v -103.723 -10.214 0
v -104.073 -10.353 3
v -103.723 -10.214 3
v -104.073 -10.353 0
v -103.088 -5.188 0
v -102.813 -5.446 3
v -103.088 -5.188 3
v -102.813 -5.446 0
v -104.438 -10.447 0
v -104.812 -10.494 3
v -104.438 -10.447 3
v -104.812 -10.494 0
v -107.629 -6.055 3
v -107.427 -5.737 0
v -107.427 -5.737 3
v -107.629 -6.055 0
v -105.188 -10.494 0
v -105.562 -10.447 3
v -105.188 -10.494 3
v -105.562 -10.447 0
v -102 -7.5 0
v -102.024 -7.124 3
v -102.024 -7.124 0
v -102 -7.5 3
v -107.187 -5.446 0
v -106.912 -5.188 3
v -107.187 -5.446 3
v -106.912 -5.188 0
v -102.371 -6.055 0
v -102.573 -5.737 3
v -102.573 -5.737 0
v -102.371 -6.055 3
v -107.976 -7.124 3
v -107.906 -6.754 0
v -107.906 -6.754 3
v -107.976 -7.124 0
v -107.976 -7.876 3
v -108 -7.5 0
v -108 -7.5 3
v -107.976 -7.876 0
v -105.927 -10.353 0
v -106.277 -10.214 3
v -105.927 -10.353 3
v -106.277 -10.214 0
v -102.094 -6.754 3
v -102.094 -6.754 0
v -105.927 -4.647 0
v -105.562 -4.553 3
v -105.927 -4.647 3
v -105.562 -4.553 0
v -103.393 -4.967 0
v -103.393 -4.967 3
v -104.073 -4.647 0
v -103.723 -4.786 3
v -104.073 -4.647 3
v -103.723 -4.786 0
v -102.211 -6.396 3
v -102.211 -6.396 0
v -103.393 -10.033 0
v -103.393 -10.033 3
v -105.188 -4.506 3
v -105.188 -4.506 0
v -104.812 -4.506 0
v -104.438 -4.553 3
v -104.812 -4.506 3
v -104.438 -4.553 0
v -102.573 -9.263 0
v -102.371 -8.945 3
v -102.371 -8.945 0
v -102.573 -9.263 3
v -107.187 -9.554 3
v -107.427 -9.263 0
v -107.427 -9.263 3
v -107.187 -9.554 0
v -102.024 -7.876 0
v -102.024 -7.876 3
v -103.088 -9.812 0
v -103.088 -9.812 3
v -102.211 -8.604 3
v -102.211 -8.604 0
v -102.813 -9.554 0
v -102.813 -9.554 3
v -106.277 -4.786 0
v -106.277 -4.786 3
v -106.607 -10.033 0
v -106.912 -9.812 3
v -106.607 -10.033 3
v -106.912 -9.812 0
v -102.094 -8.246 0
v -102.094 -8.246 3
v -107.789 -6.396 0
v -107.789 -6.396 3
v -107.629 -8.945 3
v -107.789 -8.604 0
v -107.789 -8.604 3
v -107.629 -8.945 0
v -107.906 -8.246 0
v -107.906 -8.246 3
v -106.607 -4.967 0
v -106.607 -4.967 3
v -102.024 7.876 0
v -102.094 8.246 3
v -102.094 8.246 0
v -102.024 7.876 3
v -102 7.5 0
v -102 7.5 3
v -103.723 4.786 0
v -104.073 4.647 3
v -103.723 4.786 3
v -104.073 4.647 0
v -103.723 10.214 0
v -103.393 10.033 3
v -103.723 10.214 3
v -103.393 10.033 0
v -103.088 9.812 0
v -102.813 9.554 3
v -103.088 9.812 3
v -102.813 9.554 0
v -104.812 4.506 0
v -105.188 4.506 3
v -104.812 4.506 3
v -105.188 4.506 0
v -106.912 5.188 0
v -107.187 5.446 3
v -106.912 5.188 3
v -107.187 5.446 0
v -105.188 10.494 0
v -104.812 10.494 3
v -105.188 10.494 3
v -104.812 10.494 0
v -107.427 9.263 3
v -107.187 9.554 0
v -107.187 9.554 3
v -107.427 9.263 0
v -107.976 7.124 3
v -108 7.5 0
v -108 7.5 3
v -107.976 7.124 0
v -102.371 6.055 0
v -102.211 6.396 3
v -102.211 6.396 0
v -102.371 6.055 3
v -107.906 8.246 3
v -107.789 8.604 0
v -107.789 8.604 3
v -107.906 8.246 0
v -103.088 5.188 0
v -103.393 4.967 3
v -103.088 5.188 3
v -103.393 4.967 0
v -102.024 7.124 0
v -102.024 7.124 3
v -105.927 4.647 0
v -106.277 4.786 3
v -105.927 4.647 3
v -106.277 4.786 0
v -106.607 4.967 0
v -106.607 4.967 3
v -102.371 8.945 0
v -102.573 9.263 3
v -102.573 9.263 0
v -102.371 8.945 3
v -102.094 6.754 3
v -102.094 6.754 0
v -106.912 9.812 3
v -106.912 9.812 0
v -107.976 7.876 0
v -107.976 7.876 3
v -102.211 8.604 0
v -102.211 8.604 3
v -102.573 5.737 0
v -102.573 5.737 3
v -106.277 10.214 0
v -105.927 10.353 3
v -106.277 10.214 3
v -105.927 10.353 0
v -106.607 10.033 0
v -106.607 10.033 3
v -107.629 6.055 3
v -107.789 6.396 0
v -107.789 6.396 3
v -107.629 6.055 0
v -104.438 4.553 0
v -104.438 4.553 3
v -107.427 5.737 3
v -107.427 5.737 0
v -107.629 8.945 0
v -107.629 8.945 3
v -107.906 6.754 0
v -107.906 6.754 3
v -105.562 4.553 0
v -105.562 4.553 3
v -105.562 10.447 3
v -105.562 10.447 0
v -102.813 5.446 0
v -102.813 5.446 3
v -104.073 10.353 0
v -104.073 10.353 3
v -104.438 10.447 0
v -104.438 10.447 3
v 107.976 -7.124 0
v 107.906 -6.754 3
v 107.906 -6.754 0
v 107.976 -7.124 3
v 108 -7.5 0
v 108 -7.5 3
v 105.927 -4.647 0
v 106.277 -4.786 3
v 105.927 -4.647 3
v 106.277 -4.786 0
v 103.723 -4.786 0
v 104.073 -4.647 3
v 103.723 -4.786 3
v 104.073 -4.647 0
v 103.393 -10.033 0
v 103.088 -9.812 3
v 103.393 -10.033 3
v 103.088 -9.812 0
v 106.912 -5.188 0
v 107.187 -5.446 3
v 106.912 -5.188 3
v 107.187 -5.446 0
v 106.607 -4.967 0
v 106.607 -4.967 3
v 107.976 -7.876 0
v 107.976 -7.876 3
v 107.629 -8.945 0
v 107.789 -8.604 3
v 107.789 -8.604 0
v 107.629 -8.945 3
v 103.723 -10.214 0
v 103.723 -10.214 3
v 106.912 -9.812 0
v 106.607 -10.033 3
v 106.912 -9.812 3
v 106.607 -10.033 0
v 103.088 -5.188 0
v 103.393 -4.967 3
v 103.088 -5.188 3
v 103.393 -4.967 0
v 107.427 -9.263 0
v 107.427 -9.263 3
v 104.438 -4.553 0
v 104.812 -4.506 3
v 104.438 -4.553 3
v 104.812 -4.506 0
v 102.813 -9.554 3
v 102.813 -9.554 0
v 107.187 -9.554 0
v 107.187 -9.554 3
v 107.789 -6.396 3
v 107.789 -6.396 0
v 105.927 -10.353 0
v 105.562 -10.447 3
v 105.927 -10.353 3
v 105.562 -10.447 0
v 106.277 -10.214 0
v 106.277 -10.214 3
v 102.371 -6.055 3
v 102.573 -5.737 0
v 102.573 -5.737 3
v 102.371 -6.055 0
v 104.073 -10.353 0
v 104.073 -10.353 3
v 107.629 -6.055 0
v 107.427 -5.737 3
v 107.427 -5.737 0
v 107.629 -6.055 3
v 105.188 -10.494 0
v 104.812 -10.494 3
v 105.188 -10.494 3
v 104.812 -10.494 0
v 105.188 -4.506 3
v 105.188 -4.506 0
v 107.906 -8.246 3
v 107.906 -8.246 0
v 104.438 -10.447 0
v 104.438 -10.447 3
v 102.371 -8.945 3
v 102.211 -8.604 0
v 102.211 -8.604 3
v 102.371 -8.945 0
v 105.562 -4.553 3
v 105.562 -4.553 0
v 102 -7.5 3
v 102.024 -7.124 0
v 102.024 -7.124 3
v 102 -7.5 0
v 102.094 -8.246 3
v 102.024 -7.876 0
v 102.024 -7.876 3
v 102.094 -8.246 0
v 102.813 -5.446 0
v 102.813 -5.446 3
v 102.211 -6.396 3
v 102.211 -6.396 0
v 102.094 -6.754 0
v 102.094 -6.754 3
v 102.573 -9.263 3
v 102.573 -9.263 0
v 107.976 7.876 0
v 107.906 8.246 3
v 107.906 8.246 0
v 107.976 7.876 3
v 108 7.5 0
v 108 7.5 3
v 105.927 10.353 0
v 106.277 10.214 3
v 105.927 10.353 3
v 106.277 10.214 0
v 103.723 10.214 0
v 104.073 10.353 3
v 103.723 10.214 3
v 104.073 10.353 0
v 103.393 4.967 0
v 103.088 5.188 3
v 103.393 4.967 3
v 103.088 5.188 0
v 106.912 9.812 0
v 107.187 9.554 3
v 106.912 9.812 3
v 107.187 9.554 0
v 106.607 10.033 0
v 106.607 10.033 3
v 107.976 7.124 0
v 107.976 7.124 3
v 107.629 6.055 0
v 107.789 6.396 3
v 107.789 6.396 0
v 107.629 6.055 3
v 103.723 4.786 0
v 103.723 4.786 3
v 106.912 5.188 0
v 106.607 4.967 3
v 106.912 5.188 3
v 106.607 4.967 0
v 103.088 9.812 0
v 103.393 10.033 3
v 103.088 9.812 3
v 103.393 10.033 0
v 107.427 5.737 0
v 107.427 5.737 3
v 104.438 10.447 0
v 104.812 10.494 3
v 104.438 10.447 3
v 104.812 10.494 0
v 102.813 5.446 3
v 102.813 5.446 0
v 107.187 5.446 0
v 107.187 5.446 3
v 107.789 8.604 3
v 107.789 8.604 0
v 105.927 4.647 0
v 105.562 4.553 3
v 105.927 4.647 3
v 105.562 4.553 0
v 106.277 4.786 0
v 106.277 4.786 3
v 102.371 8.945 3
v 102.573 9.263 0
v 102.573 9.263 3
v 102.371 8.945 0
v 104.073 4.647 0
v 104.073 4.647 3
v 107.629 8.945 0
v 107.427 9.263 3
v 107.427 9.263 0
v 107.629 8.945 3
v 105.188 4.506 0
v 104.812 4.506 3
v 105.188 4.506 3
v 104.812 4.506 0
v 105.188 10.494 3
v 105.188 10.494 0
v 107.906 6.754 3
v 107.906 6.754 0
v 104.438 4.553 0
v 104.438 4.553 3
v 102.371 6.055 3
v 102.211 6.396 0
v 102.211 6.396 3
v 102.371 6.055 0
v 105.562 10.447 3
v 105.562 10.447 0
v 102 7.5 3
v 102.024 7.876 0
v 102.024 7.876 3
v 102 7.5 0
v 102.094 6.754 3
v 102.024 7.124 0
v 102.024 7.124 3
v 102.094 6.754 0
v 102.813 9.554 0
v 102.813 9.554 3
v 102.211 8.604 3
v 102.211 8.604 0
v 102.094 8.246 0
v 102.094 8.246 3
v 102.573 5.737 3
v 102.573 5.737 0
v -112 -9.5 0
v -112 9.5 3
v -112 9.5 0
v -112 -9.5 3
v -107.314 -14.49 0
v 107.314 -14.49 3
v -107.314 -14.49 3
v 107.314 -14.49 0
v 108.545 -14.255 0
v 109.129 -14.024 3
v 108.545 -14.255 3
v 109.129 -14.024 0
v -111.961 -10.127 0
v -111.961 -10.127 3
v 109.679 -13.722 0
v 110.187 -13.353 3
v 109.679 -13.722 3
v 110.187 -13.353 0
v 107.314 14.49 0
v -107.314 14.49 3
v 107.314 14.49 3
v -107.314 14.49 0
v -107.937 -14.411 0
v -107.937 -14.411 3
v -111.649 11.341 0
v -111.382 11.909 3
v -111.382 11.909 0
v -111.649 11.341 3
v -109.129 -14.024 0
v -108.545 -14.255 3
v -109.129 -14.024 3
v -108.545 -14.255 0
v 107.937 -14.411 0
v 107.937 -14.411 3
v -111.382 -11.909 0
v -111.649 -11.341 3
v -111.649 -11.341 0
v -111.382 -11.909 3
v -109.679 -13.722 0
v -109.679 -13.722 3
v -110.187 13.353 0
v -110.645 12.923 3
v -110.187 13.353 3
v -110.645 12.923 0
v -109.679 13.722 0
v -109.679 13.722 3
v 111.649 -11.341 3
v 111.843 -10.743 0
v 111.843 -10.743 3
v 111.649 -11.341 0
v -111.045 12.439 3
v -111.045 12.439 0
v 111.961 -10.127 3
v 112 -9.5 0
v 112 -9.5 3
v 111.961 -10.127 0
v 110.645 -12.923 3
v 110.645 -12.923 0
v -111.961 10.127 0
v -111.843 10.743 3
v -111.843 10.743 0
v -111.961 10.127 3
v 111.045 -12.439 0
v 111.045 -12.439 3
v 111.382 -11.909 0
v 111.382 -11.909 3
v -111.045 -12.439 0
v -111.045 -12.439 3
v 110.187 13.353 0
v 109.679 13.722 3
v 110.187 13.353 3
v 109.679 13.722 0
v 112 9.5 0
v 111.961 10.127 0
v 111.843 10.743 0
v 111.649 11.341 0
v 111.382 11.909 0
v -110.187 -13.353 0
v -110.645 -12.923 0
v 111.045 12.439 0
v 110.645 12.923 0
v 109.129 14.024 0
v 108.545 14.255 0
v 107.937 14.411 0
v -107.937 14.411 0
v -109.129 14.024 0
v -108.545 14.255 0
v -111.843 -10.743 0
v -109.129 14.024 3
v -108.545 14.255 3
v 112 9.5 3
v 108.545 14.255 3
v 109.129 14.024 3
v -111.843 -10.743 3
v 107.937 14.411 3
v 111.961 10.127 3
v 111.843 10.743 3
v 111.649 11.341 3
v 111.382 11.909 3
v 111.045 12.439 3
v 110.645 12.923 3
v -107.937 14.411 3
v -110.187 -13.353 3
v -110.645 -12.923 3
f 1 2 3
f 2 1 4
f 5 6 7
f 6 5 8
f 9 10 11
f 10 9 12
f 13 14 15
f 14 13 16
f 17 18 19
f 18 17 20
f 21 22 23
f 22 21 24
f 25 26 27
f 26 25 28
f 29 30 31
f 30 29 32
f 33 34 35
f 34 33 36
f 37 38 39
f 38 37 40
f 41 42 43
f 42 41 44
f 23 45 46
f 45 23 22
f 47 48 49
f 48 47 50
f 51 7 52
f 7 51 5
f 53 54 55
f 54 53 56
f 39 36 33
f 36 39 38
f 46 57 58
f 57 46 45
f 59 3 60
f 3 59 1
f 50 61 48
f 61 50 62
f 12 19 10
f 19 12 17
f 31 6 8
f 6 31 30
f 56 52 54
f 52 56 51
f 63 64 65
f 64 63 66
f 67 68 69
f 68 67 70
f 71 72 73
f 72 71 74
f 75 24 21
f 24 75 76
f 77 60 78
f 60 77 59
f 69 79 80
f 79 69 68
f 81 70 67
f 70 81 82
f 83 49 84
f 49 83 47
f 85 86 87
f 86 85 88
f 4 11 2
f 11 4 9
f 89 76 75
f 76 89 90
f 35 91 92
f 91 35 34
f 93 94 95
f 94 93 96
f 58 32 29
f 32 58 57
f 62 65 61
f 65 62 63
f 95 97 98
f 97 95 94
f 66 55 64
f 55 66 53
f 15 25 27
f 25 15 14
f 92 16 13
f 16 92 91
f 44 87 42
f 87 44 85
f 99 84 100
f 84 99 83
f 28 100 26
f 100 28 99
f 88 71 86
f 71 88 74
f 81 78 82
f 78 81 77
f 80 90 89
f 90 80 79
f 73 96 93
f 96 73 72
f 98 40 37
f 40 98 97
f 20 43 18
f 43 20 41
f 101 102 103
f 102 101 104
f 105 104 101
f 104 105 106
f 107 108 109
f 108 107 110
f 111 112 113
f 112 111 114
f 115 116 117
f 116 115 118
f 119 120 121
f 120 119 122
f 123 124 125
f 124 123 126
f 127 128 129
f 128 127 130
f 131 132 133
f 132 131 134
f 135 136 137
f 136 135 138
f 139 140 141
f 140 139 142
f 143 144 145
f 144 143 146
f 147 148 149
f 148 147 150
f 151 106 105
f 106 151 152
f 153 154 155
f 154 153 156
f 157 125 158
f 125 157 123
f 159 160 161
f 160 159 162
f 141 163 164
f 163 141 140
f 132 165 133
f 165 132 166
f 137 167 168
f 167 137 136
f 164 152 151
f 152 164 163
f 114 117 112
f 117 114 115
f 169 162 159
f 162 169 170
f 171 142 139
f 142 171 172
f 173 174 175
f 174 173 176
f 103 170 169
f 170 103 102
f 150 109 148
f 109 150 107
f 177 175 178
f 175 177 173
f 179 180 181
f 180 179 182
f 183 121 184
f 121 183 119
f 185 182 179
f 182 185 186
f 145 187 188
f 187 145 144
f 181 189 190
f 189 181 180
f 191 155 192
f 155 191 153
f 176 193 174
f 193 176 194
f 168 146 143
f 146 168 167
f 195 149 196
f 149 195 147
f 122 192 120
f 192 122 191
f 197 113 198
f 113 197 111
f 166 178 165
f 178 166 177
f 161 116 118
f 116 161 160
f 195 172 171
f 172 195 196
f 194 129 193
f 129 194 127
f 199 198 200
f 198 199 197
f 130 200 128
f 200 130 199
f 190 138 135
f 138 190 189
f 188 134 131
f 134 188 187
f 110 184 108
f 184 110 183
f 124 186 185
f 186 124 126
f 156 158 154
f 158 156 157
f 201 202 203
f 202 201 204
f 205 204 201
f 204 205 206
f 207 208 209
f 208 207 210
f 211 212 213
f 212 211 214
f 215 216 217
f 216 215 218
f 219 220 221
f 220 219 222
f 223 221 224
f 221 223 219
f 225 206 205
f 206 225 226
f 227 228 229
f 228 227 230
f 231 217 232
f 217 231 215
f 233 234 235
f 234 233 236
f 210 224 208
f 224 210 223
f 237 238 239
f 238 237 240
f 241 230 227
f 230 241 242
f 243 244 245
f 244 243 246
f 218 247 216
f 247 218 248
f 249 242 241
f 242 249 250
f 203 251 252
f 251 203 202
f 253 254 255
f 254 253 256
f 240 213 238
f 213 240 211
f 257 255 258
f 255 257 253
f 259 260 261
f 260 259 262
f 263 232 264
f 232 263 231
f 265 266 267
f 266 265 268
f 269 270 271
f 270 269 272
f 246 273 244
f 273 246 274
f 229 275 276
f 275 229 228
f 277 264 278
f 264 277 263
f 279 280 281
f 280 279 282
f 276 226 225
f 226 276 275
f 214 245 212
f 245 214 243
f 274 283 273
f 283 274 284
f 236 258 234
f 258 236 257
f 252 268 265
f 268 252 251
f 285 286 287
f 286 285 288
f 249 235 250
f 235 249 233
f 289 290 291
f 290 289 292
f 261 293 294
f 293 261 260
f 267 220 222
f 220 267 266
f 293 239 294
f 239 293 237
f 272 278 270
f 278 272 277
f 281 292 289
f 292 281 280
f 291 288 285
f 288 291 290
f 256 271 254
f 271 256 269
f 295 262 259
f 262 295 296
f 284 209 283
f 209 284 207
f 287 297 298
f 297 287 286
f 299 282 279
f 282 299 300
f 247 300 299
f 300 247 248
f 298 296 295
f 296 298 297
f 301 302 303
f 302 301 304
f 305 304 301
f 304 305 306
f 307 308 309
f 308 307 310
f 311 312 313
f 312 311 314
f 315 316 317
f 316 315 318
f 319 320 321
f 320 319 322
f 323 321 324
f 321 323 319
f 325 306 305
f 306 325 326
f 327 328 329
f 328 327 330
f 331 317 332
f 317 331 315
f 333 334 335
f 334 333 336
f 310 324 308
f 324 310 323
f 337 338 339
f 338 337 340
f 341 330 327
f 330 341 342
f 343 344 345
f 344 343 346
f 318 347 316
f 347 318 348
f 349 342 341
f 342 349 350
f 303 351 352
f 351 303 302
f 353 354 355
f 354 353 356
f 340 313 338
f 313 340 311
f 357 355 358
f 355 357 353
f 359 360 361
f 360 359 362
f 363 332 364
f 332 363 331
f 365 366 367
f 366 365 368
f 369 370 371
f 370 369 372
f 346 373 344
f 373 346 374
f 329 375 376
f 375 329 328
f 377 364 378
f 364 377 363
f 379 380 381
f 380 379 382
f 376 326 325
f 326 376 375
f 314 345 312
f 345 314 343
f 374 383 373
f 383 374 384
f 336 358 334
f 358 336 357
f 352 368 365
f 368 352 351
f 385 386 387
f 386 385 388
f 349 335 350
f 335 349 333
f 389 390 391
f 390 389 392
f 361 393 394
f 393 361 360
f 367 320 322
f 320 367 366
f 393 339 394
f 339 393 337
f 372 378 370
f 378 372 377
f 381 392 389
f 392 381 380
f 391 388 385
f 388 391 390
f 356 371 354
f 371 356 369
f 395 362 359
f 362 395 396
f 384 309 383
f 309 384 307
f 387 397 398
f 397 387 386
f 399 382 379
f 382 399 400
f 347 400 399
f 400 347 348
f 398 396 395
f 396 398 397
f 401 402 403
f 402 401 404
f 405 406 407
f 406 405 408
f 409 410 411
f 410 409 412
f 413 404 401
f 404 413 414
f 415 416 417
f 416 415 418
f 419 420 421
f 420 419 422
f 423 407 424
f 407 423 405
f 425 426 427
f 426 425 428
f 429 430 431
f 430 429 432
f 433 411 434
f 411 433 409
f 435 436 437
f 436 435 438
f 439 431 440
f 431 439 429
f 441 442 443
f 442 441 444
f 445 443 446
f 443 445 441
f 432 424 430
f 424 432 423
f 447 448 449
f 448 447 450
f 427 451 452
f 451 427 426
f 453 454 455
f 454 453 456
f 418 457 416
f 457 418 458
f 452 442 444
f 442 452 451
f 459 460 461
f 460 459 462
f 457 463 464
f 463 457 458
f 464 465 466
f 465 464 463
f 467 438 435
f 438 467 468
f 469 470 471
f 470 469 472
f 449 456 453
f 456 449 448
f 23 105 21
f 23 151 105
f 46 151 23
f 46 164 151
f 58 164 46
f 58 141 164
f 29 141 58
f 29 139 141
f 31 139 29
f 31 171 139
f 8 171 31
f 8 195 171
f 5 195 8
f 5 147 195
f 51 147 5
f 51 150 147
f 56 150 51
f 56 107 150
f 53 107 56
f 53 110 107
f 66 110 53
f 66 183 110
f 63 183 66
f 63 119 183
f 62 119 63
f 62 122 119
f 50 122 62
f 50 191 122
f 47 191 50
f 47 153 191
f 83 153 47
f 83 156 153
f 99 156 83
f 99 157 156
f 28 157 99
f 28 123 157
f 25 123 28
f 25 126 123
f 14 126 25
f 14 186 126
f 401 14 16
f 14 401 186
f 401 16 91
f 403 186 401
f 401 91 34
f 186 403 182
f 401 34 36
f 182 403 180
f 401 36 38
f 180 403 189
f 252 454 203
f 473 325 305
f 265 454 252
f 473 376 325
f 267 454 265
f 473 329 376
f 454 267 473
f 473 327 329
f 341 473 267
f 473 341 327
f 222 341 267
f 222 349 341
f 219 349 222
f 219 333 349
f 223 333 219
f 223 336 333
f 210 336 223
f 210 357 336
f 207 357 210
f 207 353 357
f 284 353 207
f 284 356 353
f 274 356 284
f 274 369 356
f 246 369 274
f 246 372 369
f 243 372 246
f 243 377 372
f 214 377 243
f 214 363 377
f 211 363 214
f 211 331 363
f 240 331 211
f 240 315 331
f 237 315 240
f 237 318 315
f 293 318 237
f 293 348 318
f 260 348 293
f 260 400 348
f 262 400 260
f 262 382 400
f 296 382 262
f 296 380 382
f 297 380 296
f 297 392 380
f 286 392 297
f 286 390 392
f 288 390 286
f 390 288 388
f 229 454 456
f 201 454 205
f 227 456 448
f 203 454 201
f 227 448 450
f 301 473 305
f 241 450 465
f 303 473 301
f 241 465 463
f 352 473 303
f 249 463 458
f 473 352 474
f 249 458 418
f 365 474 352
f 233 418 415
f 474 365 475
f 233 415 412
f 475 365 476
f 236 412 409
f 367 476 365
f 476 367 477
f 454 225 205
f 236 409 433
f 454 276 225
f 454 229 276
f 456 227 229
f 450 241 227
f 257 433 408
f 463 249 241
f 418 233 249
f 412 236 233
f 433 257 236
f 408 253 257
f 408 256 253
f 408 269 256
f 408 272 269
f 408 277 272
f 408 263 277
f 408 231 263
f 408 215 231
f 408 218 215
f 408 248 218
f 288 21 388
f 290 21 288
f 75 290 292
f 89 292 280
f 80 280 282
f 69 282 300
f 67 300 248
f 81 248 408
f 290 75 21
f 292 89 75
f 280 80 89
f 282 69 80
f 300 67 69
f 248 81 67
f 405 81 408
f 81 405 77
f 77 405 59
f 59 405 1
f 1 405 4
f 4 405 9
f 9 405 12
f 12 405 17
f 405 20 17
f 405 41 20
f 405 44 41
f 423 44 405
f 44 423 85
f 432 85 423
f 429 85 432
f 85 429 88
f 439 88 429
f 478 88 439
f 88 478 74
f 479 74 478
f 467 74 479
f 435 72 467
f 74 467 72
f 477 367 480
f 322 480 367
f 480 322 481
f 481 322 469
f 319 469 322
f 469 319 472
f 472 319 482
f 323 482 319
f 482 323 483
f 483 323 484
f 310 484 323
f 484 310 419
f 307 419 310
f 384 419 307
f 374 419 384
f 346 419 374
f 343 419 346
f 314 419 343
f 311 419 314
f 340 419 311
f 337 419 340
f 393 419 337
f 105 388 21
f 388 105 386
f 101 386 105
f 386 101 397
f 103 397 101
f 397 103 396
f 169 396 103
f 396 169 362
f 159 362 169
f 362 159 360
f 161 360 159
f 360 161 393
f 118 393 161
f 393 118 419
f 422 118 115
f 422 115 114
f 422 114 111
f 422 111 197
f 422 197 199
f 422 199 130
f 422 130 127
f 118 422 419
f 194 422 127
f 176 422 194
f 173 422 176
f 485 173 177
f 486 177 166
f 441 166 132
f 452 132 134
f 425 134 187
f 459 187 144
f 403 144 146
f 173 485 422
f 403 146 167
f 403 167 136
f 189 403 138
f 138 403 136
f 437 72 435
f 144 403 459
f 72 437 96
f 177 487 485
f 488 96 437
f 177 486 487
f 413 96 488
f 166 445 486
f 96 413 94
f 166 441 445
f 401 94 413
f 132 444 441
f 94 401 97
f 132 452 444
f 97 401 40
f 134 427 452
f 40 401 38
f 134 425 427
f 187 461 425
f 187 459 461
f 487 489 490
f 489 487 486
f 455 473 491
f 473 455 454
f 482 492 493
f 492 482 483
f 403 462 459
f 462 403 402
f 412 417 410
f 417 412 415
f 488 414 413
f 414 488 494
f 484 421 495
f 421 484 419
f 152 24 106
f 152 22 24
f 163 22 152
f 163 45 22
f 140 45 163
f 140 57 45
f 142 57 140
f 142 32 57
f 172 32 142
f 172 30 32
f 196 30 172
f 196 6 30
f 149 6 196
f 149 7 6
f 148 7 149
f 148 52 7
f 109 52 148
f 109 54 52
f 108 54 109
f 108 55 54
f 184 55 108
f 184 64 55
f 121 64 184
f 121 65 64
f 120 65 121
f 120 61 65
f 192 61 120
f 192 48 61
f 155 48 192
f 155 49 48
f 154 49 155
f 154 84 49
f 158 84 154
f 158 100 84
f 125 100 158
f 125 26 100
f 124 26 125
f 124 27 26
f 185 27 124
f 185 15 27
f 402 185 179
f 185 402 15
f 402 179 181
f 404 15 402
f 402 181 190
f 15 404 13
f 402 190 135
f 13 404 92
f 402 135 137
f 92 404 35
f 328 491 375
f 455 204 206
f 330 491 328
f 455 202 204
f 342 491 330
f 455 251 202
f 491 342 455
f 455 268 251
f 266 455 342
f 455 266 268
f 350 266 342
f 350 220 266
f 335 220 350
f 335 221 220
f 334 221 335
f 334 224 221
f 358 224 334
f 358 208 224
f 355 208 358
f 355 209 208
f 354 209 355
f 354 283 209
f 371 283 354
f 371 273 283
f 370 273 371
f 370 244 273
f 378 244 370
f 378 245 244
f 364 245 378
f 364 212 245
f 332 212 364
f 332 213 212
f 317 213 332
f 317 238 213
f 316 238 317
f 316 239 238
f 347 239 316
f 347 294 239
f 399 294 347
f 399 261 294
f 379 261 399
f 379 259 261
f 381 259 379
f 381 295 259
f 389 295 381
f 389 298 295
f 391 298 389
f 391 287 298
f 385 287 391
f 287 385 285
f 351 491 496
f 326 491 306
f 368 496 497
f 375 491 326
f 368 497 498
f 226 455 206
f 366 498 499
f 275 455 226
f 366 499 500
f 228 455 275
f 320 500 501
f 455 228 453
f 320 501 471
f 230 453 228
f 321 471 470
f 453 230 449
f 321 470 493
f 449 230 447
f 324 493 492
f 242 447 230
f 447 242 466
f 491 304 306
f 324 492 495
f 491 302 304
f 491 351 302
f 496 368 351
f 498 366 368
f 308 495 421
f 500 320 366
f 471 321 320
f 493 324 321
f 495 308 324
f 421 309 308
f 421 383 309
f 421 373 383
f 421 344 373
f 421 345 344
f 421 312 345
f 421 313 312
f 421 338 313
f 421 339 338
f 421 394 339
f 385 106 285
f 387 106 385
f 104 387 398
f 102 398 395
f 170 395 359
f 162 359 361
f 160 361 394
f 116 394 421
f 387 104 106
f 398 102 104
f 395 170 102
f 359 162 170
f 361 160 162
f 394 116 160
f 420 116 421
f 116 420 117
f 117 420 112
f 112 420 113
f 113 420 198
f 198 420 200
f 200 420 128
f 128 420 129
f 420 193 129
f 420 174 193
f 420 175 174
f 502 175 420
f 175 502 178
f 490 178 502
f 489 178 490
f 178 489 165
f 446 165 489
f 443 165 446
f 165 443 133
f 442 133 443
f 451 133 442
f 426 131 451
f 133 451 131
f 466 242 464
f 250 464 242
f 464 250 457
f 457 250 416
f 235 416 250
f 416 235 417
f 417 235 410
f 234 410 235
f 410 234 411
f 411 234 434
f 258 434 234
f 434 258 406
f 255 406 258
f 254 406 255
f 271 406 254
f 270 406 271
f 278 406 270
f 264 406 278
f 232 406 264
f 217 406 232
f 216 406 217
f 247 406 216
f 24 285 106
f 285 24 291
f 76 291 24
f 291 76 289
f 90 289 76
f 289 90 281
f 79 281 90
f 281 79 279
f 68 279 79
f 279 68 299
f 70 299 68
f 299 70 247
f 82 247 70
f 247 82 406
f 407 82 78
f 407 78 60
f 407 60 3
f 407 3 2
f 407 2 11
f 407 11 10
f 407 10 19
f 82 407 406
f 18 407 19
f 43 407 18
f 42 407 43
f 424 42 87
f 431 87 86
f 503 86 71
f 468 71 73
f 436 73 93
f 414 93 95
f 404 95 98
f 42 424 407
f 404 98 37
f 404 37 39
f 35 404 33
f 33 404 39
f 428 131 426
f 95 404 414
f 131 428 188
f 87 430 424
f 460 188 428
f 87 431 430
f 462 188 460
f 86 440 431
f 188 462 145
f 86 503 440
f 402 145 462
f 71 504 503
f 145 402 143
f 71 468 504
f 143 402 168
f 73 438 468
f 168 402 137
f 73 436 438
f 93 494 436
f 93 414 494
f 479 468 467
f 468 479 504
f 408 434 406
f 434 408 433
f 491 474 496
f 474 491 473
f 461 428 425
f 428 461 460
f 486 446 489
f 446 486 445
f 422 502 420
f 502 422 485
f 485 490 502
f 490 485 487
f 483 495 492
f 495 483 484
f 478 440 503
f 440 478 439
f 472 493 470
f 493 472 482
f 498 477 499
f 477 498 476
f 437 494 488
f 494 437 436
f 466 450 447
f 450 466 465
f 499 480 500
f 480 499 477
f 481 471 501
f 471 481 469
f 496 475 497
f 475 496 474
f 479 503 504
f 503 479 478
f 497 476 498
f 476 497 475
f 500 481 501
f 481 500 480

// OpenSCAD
$fn = 50;


difference() {
	union() {
		hull() {
			translate(v = [-107.0000000000, 9.5000000000, 0]) {
				cylinder(h = 3, r = 5);
			}
			translate(v = [107.0000000000, 9.5000000000, 0]) {
				cylinder(h = 3, r = 5);
			}
			translate(v = [-107.0000000000, -9.5000000000, 0]) {
				cylinder(h = 3, r = 5);
			}
			translate(v = [107.0000000000, -9.5000000000, 0]) {
				cylinder(h = 3, r = 5);
			}
		}
	}
	union() {
		translate(v = [-105.0000000000, -7.5000000000, -100.0000000000]) {
			cylinder(h = 200, r = 3.0000000000);
		}
		translate(v = [-105.0000000000, 7.5000000000, -100.0000000000]) {
			cylinder(h = 200, r = 3.0000000000);
		}
		translate(v = [105.0000000000, -7.5000000000, -100.0000000000]) {
			cylinder(h = 200, r = 3.0000000000);
		}
		translate(v = [105.0000000000, 7.5000000000, -100.0000000000]) {
			cylinder(h = 200, r = 3.0000000000);
		}
	}
}
